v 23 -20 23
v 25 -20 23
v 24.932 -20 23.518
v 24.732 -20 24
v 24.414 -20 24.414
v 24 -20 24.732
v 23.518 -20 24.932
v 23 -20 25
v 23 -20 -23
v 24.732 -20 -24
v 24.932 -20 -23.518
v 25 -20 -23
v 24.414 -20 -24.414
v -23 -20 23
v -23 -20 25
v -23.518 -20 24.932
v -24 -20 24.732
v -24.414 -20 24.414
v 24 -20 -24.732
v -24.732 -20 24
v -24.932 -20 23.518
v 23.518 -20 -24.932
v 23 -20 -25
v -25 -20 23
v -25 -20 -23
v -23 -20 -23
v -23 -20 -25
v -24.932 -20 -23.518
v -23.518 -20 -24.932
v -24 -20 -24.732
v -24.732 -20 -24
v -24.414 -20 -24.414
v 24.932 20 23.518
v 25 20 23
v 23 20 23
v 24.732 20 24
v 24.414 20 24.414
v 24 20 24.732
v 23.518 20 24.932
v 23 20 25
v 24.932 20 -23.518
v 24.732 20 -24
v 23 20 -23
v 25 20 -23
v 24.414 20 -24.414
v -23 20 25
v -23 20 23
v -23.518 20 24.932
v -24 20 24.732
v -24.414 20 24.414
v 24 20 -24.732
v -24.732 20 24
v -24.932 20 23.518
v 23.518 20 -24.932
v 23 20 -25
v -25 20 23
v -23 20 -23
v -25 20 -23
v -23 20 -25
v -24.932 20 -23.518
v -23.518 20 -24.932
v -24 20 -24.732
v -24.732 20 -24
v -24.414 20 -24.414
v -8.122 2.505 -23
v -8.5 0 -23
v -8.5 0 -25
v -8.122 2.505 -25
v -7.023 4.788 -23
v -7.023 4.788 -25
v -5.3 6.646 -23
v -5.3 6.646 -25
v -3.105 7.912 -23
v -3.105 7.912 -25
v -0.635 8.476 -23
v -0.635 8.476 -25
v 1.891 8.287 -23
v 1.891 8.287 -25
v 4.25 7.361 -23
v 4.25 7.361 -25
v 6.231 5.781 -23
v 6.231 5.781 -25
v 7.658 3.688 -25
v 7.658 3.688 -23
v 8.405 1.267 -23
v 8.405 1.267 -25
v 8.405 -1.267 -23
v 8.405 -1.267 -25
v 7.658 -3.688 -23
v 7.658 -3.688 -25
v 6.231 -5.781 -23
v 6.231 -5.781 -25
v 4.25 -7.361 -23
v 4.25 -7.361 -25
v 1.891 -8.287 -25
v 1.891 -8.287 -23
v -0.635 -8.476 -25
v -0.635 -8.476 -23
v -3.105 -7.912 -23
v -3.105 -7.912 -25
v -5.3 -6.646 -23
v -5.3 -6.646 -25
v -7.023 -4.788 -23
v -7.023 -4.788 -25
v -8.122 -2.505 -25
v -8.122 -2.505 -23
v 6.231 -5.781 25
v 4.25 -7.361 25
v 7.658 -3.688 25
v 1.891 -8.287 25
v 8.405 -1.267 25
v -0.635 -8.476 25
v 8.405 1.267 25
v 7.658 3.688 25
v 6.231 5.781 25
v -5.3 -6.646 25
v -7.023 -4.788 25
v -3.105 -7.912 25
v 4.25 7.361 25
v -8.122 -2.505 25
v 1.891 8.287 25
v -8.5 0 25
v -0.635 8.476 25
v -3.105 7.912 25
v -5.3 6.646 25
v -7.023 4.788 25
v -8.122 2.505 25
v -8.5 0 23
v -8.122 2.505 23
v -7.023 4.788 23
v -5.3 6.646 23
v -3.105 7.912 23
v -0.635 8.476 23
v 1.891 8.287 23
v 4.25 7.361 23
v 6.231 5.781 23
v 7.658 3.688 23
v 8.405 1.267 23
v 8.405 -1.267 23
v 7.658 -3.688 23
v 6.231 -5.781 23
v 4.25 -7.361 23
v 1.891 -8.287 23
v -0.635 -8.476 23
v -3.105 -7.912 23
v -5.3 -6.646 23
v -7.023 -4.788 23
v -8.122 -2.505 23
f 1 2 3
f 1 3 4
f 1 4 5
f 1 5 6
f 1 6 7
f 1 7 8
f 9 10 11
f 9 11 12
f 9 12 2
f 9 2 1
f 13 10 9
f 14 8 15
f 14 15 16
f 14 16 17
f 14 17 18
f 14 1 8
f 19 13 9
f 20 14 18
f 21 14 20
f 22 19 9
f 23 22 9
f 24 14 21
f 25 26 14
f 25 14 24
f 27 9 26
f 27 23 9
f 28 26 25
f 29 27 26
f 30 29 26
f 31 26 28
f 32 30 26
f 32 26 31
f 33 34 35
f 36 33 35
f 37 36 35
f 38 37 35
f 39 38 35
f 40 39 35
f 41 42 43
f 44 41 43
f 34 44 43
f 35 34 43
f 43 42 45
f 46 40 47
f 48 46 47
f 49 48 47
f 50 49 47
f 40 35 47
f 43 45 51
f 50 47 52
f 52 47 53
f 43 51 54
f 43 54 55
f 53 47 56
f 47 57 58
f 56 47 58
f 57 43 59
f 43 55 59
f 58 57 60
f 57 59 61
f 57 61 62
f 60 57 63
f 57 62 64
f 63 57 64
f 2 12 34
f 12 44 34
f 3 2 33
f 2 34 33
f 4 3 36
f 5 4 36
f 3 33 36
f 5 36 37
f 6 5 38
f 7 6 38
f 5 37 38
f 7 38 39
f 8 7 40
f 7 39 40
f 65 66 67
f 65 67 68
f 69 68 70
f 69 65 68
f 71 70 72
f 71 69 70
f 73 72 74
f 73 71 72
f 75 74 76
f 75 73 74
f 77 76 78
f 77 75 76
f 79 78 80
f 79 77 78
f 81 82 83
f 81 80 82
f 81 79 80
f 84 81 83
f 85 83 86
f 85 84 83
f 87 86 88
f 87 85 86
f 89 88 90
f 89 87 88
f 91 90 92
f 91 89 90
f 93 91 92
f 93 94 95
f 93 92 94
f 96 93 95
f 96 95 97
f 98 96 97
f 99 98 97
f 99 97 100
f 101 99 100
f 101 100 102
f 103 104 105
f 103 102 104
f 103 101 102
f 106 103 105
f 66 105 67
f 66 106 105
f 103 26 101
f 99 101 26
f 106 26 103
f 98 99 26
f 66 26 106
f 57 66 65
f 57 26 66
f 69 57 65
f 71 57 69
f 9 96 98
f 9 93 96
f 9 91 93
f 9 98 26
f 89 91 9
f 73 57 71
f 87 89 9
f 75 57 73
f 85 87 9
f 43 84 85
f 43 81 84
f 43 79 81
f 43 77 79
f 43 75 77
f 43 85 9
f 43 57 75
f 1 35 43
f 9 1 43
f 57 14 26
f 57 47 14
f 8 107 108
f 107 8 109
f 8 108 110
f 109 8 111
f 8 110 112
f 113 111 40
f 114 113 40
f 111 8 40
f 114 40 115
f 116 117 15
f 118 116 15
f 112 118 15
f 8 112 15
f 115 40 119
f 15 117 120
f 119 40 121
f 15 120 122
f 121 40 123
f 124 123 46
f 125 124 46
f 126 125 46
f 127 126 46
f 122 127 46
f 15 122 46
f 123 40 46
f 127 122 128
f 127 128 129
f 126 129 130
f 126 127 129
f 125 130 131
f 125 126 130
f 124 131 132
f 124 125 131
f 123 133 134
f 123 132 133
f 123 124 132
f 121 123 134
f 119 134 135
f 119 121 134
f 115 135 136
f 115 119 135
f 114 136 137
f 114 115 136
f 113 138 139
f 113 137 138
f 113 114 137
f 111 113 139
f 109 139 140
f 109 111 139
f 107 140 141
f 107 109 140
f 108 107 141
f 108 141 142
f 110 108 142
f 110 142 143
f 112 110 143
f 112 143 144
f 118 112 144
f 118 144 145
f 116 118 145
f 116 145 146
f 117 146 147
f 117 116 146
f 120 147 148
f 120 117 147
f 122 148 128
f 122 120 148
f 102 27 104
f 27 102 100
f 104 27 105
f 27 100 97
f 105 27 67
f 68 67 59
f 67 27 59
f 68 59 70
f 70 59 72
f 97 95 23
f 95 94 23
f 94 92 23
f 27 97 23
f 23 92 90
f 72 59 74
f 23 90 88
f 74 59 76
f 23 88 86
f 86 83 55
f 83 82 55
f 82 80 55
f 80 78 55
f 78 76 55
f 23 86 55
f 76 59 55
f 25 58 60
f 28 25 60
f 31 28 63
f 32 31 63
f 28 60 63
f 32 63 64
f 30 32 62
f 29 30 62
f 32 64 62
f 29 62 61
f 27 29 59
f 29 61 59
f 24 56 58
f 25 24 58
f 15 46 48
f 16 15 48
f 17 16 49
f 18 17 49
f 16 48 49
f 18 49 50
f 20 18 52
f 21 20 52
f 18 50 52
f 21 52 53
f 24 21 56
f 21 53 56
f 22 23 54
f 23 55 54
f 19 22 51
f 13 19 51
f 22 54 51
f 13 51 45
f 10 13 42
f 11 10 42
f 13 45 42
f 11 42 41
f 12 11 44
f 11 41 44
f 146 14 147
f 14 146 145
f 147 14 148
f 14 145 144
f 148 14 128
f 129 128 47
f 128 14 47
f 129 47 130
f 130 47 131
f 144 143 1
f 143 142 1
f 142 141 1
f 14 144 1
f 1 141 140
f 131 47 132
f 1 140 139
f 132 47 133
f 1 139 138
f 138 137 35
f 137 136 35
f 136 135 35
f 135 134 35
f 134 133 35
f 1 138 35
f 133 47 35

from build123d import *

# Parameters (mm, degrees)
SKETCH1_W               = 46
SKETCH1_H               = 46
EXTRUDE_THIN1_DEPTH     = 20
CUT_EXTRUDE1_DEPTH      = 58.697486947
CUT_EXTRUDE1_DEPTH_BACK = 58.697486947
SKETCH2_R               = 8.5


with BuildPart() as part:
    # Sketch1 → Extrude-Thin1 (new, symmetric)
    with BuildSketch(Plane(origin=(0, 0, 0), x_dir=(1, 0, 0), z_dir=(0, 1, 0))):
        with BuildLine():
            Line((-23, 25), (23, 25))
            ThreePointArc((23, 25), (24.414213562, 24.414213562), (25, 23))
            Line((25, 23), (25, -23))
            ThreePointArc((25, -23), (24.414213562, -24.414213562), (23, -25))
            Line((23, -25), (-23, -25))
            ThreePointArc((-23, -25), (-24.414213562, -24.414213562), (-25, -23))
            Line((-25, -23), (-25, 23))
            ThreePointArc((-25, 23), (-24.414213562, 24.414213562), (-23, 25))
        make_face()
        Rectangle(SKETCH1_W, SKETCH1_H, mode=Mode.SUBTRACT)
    extrude(amount=EXTRUDE_THIN1_DEPTH, both=True)

    # Sketch2 → Cut-Extrude1 (cut, two sides: drawn at the far end of the back side and taken through both)
    with BuildSketch(Plane(origin=(0, 0, 23), x_dir=(-1, 0, 0), z_dir=(0, 0, -1)).offset(-CUT_EXTRUDE1_DEPTH_BACK)):
        Circle(SKETCH2_R)
    extrude(amount=CUT_EXTRUDE1_DEPTH + CUT_EXTRUDE1_DEPTH_BACK, mode=Mode.SUBTRACT)


solid = part.part
